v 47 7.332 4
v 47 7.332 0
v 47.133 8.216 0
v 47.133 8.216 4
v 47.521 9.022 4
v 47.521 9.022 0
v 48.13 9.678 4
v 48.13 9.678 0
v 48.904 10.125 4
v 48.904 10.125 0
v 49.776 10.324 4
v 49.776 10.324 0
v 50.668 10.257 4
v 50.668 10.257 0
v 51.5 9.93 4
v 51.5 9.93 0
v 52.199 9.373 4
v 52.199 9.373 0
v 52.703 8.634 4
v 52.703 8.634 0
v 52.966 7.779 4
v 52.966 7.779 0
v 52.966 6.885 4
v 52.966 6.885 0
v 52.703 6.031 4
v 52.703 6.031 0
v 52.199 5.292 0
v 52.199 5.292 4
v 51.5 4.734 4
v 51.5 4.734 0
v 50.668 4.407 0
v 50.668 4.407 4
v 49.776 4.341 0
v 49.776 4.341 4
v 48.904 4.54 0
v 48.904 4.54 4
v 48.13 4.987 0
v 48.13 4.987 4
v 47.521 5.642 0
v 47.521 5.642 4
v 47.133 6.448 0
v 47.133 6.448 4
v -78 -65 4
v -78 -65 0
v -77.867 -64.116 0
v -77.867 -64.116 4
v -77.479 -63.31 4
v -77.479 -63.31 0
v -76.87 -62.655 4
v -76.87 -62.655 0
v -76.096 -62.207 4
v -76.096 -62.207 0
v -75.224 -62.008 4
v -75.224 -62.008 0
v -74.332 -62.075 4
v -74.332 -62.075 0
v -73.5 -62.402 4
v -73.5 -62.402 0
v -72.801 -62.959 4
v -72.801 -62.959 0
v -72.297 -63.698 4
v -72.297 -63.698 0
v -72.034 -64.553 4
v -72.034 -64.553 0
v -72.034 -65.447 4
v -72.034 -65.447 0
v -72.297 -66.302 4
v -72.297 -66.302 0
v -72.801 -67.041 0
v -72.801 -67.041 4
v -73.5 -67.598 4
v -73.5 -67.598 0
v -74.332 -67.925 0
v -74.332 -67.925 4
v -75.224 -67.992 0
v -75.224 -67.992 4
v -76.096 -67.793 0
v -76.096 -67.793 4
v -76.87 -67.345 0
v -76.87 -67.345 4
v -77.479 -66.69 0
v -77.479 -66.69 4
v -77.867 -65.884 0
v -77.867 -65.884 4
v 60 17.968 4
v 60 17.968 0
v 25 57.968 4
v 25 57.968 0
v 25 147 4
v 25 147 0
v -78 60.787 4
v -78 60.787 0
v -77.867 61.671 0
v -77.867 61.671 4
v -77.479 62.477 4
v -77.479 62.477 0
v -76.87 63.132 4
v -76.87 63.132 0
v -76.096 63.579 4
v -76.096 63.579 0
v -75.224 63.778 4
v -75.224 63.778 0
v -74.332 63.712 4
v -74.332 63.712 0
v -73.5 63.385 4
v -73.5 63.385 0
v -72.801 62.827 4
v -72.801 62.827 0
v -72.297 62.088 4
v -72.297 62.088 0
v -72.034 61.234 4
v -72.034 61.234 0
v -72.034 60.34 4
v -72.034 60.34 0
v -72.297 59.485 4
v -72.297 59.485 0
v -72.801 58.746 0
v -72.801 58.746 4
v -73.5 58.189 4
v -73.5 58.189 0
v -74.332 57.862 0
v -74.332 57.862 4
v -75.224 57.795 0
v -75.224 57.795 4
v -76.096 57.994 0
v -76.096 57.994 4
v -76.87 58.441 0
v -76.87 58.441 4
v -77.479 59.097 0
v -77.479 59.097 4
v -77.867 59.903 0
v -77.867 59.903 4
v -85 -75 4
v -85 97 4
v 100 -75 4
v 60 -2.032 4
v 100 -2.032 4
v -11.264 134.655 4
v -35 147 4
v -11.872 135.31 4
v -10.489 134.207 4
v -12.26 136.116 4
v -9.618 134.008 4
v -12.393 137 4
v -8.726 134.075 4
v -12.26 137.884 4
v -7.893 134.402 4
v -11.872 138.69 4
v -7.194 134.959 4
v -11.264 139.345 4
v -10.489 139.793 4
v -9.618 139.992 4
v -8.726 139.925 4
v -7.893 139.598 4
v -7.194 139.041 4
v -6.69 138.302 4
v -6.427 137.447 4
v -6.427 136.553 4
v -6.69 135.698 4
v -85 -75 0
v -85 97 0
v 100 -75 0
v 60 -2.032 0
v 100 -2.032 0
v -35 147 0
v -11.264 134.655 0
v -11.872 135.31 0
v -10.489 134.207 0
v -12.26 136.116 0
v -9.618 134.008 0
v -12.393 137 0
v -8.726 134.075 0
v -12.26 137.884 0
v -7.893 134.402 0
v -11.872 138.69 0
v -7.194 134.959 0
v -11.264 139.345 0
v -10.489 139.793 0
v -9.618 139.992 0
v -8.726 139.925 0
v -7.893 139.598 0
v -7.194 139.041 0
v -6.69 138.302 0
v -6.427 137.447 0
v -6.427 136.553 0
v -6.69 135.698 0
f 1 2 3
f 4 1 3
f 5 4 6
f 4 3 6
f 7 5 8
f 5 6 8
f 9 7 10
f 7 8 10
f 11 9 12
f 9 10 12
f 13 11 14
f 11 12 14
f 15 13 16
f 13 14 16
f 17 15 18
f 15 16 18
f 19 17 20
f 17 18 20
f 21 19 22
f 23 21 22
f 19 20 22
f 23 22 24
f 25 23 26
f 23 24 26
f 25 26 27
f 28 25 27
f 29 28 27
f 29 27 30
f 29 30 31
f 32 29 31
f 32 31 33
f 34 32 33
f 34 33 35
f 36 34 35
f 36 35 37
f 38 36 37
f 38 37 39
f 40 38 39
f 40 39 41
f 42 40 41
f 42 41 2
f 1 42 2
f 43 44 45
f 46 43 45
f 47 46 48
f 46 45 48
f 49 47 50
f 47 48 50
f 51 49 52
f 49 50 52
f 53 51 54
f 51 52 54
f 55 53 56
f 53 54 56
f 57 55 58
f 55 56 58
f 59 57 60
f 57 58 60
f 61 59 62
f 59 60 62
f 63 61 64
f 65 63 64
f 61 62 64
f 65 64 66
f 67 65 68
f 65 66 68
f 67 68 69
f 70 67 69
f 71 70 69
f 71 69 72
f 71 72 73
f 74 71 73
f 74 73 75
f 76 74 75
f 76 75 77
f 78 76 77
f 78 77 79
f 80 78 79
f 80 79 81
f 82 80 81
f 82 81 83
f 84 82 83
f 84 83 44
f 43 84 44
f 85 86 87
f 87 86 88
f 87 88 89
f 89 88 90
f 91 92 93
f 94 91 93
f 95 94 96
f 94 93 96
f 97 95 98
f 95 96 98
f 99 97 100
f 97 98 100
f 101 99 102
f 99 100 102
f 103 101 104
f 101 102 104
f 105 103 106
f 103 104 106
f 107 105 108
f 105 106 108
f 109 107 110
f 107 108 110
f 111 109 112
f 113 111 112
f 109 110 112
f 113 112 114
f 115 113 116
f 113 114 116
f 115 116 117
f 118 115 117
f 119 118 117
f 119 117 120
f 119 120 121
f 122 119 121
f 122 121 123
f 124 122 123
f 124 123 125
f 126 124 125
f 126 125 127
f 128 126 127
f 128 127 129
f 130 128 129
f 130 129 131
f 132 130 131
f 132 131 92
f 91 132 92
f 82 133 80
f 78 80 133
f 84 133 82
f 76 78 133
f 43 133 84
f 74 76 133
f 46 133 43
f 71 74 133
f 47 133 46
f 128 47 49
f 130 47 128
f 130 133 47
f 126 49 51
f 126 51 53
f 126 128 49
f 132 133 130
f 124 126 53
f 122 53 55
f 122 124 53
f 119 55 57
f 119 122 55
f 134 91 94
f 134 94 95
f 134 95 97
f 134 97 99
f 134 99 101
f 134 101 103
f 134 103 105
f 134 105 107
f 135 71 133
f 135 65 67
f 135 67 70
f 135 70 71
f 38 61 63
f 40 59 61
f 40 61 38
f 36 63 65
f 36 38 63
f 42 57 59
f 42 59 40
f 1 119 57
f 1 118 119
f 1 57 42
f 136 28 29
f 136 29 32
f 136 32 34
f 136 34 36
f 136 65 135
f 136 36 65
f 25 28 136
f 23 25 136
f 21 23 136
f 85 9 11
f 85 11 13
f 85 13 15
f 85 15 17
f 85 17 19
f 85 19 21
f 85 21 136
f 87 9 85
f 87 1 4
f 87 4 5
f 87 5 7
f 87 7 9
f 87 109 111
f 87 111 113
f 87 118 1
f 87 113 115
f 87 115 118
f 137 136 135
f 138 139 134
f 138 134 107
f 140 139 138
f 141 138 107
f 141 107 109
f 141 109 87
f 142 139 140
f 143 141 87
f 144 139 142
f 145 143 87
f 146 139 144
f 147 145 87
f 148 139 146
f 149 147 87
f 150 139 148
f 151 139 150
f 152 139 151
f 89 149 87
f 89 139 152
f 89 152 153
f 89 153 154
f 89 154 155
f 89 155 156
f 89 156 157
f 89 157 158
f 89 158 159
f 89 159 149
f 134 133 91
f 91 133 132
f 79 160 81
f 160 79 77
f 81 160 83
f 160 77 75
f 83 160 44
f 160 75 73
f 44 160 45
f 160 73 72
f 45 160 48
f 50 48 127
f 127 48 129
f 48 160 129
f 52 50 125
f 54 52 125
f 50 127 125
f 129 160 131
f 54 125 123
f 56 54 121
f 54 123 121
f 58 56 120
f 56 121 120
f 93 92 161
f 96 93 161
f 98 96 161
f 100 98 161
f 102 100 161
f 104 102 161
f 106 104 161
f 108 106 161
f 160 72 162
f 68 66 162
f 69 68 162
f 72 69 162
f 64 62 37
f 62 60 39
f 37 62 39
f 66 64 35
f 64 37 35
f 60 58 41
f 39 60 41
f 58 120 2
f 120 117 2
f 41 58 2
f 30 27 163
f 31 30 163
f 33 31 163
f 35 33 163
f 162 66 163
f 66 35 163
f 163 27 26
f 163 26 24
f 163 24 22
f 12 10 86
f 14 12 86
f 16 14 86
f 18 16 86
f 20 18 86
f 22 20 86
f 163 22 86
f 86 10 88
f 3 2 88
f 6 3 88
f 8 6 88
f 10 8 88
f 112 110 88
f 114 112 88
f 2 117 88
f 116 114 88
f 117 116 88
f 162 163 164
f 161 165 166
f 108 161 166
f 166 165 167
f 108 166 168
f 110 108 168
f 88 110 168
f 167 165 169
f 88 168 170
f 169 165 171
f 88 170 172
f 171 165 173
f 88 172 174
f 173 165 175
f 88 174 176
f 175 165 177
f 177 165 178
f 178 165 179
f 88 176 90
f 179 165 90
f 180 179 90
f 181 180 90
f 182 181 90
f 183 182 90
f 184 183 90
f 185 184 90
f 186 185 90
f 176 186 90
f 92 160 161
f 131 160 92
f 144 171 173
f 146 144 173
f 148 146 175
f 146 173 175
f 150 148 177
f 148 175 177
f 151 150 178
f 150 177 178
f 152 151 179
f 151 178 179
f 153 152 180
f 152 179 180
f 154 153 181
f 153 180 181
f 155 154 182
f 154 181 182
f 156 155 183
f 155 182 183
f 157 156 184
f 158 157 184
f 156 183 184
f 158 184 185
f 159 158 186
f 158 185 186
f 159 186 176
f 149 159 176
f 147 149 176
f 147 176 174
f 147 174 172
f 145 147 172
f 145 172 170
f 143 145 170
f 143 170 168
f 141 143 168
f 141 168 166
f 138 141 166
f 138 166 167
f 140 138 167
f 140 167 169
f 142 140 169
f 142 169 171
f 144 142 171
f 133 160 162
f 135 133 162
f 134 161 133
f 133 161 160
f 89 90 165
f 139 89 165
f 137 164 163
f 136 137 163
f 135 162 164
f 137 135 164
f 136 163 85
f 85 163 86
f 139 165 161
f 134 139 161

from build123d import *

# Parameters (mm, degrees)
EXTRUDE_1_DEPTH     = 4
SKETCH_2_R          = 3
CUT_EXTRUDE_1_DEPTH = 10


with BuildPart() as part:
    # 草图1 → 凸台-拉伸1 (new body)
    with BuildSketch(Plane.XY):
        Polygon((-85, -75), (100, -75), (100, -2.031815791), (60, -2.031815791), (60, 17.968184209), (25, 57.968184209), (25, 147), (-35, 147), (-85, 97), align=None)
    extrude(amount=EXTRUDE_1_DEPTH)

    # 草图2 → 切除-拉伸1 (cut)
    with BuildSketch(Plane(origin=(0, 0, 0), x_dir=(-1, 0, 0), z_dir=(0, 0, -1))):
        with Locations((75, -65)):
            Circle(SKETCH_2_R)
        with Locations((-50, 7.332157467)):
            Circle(SKETCH_2_R)
        with Locations((9.393398282, 137)):
            Circle(SKETCH_2_R)
        with Locations((75, 60.786796564)):
            Circle(SKETCH_2_R)
    extrude(amount=-CUT_EXTRUDE_1_DEPTH, mode=Mode.SUBTRACT)


solid = part.part
